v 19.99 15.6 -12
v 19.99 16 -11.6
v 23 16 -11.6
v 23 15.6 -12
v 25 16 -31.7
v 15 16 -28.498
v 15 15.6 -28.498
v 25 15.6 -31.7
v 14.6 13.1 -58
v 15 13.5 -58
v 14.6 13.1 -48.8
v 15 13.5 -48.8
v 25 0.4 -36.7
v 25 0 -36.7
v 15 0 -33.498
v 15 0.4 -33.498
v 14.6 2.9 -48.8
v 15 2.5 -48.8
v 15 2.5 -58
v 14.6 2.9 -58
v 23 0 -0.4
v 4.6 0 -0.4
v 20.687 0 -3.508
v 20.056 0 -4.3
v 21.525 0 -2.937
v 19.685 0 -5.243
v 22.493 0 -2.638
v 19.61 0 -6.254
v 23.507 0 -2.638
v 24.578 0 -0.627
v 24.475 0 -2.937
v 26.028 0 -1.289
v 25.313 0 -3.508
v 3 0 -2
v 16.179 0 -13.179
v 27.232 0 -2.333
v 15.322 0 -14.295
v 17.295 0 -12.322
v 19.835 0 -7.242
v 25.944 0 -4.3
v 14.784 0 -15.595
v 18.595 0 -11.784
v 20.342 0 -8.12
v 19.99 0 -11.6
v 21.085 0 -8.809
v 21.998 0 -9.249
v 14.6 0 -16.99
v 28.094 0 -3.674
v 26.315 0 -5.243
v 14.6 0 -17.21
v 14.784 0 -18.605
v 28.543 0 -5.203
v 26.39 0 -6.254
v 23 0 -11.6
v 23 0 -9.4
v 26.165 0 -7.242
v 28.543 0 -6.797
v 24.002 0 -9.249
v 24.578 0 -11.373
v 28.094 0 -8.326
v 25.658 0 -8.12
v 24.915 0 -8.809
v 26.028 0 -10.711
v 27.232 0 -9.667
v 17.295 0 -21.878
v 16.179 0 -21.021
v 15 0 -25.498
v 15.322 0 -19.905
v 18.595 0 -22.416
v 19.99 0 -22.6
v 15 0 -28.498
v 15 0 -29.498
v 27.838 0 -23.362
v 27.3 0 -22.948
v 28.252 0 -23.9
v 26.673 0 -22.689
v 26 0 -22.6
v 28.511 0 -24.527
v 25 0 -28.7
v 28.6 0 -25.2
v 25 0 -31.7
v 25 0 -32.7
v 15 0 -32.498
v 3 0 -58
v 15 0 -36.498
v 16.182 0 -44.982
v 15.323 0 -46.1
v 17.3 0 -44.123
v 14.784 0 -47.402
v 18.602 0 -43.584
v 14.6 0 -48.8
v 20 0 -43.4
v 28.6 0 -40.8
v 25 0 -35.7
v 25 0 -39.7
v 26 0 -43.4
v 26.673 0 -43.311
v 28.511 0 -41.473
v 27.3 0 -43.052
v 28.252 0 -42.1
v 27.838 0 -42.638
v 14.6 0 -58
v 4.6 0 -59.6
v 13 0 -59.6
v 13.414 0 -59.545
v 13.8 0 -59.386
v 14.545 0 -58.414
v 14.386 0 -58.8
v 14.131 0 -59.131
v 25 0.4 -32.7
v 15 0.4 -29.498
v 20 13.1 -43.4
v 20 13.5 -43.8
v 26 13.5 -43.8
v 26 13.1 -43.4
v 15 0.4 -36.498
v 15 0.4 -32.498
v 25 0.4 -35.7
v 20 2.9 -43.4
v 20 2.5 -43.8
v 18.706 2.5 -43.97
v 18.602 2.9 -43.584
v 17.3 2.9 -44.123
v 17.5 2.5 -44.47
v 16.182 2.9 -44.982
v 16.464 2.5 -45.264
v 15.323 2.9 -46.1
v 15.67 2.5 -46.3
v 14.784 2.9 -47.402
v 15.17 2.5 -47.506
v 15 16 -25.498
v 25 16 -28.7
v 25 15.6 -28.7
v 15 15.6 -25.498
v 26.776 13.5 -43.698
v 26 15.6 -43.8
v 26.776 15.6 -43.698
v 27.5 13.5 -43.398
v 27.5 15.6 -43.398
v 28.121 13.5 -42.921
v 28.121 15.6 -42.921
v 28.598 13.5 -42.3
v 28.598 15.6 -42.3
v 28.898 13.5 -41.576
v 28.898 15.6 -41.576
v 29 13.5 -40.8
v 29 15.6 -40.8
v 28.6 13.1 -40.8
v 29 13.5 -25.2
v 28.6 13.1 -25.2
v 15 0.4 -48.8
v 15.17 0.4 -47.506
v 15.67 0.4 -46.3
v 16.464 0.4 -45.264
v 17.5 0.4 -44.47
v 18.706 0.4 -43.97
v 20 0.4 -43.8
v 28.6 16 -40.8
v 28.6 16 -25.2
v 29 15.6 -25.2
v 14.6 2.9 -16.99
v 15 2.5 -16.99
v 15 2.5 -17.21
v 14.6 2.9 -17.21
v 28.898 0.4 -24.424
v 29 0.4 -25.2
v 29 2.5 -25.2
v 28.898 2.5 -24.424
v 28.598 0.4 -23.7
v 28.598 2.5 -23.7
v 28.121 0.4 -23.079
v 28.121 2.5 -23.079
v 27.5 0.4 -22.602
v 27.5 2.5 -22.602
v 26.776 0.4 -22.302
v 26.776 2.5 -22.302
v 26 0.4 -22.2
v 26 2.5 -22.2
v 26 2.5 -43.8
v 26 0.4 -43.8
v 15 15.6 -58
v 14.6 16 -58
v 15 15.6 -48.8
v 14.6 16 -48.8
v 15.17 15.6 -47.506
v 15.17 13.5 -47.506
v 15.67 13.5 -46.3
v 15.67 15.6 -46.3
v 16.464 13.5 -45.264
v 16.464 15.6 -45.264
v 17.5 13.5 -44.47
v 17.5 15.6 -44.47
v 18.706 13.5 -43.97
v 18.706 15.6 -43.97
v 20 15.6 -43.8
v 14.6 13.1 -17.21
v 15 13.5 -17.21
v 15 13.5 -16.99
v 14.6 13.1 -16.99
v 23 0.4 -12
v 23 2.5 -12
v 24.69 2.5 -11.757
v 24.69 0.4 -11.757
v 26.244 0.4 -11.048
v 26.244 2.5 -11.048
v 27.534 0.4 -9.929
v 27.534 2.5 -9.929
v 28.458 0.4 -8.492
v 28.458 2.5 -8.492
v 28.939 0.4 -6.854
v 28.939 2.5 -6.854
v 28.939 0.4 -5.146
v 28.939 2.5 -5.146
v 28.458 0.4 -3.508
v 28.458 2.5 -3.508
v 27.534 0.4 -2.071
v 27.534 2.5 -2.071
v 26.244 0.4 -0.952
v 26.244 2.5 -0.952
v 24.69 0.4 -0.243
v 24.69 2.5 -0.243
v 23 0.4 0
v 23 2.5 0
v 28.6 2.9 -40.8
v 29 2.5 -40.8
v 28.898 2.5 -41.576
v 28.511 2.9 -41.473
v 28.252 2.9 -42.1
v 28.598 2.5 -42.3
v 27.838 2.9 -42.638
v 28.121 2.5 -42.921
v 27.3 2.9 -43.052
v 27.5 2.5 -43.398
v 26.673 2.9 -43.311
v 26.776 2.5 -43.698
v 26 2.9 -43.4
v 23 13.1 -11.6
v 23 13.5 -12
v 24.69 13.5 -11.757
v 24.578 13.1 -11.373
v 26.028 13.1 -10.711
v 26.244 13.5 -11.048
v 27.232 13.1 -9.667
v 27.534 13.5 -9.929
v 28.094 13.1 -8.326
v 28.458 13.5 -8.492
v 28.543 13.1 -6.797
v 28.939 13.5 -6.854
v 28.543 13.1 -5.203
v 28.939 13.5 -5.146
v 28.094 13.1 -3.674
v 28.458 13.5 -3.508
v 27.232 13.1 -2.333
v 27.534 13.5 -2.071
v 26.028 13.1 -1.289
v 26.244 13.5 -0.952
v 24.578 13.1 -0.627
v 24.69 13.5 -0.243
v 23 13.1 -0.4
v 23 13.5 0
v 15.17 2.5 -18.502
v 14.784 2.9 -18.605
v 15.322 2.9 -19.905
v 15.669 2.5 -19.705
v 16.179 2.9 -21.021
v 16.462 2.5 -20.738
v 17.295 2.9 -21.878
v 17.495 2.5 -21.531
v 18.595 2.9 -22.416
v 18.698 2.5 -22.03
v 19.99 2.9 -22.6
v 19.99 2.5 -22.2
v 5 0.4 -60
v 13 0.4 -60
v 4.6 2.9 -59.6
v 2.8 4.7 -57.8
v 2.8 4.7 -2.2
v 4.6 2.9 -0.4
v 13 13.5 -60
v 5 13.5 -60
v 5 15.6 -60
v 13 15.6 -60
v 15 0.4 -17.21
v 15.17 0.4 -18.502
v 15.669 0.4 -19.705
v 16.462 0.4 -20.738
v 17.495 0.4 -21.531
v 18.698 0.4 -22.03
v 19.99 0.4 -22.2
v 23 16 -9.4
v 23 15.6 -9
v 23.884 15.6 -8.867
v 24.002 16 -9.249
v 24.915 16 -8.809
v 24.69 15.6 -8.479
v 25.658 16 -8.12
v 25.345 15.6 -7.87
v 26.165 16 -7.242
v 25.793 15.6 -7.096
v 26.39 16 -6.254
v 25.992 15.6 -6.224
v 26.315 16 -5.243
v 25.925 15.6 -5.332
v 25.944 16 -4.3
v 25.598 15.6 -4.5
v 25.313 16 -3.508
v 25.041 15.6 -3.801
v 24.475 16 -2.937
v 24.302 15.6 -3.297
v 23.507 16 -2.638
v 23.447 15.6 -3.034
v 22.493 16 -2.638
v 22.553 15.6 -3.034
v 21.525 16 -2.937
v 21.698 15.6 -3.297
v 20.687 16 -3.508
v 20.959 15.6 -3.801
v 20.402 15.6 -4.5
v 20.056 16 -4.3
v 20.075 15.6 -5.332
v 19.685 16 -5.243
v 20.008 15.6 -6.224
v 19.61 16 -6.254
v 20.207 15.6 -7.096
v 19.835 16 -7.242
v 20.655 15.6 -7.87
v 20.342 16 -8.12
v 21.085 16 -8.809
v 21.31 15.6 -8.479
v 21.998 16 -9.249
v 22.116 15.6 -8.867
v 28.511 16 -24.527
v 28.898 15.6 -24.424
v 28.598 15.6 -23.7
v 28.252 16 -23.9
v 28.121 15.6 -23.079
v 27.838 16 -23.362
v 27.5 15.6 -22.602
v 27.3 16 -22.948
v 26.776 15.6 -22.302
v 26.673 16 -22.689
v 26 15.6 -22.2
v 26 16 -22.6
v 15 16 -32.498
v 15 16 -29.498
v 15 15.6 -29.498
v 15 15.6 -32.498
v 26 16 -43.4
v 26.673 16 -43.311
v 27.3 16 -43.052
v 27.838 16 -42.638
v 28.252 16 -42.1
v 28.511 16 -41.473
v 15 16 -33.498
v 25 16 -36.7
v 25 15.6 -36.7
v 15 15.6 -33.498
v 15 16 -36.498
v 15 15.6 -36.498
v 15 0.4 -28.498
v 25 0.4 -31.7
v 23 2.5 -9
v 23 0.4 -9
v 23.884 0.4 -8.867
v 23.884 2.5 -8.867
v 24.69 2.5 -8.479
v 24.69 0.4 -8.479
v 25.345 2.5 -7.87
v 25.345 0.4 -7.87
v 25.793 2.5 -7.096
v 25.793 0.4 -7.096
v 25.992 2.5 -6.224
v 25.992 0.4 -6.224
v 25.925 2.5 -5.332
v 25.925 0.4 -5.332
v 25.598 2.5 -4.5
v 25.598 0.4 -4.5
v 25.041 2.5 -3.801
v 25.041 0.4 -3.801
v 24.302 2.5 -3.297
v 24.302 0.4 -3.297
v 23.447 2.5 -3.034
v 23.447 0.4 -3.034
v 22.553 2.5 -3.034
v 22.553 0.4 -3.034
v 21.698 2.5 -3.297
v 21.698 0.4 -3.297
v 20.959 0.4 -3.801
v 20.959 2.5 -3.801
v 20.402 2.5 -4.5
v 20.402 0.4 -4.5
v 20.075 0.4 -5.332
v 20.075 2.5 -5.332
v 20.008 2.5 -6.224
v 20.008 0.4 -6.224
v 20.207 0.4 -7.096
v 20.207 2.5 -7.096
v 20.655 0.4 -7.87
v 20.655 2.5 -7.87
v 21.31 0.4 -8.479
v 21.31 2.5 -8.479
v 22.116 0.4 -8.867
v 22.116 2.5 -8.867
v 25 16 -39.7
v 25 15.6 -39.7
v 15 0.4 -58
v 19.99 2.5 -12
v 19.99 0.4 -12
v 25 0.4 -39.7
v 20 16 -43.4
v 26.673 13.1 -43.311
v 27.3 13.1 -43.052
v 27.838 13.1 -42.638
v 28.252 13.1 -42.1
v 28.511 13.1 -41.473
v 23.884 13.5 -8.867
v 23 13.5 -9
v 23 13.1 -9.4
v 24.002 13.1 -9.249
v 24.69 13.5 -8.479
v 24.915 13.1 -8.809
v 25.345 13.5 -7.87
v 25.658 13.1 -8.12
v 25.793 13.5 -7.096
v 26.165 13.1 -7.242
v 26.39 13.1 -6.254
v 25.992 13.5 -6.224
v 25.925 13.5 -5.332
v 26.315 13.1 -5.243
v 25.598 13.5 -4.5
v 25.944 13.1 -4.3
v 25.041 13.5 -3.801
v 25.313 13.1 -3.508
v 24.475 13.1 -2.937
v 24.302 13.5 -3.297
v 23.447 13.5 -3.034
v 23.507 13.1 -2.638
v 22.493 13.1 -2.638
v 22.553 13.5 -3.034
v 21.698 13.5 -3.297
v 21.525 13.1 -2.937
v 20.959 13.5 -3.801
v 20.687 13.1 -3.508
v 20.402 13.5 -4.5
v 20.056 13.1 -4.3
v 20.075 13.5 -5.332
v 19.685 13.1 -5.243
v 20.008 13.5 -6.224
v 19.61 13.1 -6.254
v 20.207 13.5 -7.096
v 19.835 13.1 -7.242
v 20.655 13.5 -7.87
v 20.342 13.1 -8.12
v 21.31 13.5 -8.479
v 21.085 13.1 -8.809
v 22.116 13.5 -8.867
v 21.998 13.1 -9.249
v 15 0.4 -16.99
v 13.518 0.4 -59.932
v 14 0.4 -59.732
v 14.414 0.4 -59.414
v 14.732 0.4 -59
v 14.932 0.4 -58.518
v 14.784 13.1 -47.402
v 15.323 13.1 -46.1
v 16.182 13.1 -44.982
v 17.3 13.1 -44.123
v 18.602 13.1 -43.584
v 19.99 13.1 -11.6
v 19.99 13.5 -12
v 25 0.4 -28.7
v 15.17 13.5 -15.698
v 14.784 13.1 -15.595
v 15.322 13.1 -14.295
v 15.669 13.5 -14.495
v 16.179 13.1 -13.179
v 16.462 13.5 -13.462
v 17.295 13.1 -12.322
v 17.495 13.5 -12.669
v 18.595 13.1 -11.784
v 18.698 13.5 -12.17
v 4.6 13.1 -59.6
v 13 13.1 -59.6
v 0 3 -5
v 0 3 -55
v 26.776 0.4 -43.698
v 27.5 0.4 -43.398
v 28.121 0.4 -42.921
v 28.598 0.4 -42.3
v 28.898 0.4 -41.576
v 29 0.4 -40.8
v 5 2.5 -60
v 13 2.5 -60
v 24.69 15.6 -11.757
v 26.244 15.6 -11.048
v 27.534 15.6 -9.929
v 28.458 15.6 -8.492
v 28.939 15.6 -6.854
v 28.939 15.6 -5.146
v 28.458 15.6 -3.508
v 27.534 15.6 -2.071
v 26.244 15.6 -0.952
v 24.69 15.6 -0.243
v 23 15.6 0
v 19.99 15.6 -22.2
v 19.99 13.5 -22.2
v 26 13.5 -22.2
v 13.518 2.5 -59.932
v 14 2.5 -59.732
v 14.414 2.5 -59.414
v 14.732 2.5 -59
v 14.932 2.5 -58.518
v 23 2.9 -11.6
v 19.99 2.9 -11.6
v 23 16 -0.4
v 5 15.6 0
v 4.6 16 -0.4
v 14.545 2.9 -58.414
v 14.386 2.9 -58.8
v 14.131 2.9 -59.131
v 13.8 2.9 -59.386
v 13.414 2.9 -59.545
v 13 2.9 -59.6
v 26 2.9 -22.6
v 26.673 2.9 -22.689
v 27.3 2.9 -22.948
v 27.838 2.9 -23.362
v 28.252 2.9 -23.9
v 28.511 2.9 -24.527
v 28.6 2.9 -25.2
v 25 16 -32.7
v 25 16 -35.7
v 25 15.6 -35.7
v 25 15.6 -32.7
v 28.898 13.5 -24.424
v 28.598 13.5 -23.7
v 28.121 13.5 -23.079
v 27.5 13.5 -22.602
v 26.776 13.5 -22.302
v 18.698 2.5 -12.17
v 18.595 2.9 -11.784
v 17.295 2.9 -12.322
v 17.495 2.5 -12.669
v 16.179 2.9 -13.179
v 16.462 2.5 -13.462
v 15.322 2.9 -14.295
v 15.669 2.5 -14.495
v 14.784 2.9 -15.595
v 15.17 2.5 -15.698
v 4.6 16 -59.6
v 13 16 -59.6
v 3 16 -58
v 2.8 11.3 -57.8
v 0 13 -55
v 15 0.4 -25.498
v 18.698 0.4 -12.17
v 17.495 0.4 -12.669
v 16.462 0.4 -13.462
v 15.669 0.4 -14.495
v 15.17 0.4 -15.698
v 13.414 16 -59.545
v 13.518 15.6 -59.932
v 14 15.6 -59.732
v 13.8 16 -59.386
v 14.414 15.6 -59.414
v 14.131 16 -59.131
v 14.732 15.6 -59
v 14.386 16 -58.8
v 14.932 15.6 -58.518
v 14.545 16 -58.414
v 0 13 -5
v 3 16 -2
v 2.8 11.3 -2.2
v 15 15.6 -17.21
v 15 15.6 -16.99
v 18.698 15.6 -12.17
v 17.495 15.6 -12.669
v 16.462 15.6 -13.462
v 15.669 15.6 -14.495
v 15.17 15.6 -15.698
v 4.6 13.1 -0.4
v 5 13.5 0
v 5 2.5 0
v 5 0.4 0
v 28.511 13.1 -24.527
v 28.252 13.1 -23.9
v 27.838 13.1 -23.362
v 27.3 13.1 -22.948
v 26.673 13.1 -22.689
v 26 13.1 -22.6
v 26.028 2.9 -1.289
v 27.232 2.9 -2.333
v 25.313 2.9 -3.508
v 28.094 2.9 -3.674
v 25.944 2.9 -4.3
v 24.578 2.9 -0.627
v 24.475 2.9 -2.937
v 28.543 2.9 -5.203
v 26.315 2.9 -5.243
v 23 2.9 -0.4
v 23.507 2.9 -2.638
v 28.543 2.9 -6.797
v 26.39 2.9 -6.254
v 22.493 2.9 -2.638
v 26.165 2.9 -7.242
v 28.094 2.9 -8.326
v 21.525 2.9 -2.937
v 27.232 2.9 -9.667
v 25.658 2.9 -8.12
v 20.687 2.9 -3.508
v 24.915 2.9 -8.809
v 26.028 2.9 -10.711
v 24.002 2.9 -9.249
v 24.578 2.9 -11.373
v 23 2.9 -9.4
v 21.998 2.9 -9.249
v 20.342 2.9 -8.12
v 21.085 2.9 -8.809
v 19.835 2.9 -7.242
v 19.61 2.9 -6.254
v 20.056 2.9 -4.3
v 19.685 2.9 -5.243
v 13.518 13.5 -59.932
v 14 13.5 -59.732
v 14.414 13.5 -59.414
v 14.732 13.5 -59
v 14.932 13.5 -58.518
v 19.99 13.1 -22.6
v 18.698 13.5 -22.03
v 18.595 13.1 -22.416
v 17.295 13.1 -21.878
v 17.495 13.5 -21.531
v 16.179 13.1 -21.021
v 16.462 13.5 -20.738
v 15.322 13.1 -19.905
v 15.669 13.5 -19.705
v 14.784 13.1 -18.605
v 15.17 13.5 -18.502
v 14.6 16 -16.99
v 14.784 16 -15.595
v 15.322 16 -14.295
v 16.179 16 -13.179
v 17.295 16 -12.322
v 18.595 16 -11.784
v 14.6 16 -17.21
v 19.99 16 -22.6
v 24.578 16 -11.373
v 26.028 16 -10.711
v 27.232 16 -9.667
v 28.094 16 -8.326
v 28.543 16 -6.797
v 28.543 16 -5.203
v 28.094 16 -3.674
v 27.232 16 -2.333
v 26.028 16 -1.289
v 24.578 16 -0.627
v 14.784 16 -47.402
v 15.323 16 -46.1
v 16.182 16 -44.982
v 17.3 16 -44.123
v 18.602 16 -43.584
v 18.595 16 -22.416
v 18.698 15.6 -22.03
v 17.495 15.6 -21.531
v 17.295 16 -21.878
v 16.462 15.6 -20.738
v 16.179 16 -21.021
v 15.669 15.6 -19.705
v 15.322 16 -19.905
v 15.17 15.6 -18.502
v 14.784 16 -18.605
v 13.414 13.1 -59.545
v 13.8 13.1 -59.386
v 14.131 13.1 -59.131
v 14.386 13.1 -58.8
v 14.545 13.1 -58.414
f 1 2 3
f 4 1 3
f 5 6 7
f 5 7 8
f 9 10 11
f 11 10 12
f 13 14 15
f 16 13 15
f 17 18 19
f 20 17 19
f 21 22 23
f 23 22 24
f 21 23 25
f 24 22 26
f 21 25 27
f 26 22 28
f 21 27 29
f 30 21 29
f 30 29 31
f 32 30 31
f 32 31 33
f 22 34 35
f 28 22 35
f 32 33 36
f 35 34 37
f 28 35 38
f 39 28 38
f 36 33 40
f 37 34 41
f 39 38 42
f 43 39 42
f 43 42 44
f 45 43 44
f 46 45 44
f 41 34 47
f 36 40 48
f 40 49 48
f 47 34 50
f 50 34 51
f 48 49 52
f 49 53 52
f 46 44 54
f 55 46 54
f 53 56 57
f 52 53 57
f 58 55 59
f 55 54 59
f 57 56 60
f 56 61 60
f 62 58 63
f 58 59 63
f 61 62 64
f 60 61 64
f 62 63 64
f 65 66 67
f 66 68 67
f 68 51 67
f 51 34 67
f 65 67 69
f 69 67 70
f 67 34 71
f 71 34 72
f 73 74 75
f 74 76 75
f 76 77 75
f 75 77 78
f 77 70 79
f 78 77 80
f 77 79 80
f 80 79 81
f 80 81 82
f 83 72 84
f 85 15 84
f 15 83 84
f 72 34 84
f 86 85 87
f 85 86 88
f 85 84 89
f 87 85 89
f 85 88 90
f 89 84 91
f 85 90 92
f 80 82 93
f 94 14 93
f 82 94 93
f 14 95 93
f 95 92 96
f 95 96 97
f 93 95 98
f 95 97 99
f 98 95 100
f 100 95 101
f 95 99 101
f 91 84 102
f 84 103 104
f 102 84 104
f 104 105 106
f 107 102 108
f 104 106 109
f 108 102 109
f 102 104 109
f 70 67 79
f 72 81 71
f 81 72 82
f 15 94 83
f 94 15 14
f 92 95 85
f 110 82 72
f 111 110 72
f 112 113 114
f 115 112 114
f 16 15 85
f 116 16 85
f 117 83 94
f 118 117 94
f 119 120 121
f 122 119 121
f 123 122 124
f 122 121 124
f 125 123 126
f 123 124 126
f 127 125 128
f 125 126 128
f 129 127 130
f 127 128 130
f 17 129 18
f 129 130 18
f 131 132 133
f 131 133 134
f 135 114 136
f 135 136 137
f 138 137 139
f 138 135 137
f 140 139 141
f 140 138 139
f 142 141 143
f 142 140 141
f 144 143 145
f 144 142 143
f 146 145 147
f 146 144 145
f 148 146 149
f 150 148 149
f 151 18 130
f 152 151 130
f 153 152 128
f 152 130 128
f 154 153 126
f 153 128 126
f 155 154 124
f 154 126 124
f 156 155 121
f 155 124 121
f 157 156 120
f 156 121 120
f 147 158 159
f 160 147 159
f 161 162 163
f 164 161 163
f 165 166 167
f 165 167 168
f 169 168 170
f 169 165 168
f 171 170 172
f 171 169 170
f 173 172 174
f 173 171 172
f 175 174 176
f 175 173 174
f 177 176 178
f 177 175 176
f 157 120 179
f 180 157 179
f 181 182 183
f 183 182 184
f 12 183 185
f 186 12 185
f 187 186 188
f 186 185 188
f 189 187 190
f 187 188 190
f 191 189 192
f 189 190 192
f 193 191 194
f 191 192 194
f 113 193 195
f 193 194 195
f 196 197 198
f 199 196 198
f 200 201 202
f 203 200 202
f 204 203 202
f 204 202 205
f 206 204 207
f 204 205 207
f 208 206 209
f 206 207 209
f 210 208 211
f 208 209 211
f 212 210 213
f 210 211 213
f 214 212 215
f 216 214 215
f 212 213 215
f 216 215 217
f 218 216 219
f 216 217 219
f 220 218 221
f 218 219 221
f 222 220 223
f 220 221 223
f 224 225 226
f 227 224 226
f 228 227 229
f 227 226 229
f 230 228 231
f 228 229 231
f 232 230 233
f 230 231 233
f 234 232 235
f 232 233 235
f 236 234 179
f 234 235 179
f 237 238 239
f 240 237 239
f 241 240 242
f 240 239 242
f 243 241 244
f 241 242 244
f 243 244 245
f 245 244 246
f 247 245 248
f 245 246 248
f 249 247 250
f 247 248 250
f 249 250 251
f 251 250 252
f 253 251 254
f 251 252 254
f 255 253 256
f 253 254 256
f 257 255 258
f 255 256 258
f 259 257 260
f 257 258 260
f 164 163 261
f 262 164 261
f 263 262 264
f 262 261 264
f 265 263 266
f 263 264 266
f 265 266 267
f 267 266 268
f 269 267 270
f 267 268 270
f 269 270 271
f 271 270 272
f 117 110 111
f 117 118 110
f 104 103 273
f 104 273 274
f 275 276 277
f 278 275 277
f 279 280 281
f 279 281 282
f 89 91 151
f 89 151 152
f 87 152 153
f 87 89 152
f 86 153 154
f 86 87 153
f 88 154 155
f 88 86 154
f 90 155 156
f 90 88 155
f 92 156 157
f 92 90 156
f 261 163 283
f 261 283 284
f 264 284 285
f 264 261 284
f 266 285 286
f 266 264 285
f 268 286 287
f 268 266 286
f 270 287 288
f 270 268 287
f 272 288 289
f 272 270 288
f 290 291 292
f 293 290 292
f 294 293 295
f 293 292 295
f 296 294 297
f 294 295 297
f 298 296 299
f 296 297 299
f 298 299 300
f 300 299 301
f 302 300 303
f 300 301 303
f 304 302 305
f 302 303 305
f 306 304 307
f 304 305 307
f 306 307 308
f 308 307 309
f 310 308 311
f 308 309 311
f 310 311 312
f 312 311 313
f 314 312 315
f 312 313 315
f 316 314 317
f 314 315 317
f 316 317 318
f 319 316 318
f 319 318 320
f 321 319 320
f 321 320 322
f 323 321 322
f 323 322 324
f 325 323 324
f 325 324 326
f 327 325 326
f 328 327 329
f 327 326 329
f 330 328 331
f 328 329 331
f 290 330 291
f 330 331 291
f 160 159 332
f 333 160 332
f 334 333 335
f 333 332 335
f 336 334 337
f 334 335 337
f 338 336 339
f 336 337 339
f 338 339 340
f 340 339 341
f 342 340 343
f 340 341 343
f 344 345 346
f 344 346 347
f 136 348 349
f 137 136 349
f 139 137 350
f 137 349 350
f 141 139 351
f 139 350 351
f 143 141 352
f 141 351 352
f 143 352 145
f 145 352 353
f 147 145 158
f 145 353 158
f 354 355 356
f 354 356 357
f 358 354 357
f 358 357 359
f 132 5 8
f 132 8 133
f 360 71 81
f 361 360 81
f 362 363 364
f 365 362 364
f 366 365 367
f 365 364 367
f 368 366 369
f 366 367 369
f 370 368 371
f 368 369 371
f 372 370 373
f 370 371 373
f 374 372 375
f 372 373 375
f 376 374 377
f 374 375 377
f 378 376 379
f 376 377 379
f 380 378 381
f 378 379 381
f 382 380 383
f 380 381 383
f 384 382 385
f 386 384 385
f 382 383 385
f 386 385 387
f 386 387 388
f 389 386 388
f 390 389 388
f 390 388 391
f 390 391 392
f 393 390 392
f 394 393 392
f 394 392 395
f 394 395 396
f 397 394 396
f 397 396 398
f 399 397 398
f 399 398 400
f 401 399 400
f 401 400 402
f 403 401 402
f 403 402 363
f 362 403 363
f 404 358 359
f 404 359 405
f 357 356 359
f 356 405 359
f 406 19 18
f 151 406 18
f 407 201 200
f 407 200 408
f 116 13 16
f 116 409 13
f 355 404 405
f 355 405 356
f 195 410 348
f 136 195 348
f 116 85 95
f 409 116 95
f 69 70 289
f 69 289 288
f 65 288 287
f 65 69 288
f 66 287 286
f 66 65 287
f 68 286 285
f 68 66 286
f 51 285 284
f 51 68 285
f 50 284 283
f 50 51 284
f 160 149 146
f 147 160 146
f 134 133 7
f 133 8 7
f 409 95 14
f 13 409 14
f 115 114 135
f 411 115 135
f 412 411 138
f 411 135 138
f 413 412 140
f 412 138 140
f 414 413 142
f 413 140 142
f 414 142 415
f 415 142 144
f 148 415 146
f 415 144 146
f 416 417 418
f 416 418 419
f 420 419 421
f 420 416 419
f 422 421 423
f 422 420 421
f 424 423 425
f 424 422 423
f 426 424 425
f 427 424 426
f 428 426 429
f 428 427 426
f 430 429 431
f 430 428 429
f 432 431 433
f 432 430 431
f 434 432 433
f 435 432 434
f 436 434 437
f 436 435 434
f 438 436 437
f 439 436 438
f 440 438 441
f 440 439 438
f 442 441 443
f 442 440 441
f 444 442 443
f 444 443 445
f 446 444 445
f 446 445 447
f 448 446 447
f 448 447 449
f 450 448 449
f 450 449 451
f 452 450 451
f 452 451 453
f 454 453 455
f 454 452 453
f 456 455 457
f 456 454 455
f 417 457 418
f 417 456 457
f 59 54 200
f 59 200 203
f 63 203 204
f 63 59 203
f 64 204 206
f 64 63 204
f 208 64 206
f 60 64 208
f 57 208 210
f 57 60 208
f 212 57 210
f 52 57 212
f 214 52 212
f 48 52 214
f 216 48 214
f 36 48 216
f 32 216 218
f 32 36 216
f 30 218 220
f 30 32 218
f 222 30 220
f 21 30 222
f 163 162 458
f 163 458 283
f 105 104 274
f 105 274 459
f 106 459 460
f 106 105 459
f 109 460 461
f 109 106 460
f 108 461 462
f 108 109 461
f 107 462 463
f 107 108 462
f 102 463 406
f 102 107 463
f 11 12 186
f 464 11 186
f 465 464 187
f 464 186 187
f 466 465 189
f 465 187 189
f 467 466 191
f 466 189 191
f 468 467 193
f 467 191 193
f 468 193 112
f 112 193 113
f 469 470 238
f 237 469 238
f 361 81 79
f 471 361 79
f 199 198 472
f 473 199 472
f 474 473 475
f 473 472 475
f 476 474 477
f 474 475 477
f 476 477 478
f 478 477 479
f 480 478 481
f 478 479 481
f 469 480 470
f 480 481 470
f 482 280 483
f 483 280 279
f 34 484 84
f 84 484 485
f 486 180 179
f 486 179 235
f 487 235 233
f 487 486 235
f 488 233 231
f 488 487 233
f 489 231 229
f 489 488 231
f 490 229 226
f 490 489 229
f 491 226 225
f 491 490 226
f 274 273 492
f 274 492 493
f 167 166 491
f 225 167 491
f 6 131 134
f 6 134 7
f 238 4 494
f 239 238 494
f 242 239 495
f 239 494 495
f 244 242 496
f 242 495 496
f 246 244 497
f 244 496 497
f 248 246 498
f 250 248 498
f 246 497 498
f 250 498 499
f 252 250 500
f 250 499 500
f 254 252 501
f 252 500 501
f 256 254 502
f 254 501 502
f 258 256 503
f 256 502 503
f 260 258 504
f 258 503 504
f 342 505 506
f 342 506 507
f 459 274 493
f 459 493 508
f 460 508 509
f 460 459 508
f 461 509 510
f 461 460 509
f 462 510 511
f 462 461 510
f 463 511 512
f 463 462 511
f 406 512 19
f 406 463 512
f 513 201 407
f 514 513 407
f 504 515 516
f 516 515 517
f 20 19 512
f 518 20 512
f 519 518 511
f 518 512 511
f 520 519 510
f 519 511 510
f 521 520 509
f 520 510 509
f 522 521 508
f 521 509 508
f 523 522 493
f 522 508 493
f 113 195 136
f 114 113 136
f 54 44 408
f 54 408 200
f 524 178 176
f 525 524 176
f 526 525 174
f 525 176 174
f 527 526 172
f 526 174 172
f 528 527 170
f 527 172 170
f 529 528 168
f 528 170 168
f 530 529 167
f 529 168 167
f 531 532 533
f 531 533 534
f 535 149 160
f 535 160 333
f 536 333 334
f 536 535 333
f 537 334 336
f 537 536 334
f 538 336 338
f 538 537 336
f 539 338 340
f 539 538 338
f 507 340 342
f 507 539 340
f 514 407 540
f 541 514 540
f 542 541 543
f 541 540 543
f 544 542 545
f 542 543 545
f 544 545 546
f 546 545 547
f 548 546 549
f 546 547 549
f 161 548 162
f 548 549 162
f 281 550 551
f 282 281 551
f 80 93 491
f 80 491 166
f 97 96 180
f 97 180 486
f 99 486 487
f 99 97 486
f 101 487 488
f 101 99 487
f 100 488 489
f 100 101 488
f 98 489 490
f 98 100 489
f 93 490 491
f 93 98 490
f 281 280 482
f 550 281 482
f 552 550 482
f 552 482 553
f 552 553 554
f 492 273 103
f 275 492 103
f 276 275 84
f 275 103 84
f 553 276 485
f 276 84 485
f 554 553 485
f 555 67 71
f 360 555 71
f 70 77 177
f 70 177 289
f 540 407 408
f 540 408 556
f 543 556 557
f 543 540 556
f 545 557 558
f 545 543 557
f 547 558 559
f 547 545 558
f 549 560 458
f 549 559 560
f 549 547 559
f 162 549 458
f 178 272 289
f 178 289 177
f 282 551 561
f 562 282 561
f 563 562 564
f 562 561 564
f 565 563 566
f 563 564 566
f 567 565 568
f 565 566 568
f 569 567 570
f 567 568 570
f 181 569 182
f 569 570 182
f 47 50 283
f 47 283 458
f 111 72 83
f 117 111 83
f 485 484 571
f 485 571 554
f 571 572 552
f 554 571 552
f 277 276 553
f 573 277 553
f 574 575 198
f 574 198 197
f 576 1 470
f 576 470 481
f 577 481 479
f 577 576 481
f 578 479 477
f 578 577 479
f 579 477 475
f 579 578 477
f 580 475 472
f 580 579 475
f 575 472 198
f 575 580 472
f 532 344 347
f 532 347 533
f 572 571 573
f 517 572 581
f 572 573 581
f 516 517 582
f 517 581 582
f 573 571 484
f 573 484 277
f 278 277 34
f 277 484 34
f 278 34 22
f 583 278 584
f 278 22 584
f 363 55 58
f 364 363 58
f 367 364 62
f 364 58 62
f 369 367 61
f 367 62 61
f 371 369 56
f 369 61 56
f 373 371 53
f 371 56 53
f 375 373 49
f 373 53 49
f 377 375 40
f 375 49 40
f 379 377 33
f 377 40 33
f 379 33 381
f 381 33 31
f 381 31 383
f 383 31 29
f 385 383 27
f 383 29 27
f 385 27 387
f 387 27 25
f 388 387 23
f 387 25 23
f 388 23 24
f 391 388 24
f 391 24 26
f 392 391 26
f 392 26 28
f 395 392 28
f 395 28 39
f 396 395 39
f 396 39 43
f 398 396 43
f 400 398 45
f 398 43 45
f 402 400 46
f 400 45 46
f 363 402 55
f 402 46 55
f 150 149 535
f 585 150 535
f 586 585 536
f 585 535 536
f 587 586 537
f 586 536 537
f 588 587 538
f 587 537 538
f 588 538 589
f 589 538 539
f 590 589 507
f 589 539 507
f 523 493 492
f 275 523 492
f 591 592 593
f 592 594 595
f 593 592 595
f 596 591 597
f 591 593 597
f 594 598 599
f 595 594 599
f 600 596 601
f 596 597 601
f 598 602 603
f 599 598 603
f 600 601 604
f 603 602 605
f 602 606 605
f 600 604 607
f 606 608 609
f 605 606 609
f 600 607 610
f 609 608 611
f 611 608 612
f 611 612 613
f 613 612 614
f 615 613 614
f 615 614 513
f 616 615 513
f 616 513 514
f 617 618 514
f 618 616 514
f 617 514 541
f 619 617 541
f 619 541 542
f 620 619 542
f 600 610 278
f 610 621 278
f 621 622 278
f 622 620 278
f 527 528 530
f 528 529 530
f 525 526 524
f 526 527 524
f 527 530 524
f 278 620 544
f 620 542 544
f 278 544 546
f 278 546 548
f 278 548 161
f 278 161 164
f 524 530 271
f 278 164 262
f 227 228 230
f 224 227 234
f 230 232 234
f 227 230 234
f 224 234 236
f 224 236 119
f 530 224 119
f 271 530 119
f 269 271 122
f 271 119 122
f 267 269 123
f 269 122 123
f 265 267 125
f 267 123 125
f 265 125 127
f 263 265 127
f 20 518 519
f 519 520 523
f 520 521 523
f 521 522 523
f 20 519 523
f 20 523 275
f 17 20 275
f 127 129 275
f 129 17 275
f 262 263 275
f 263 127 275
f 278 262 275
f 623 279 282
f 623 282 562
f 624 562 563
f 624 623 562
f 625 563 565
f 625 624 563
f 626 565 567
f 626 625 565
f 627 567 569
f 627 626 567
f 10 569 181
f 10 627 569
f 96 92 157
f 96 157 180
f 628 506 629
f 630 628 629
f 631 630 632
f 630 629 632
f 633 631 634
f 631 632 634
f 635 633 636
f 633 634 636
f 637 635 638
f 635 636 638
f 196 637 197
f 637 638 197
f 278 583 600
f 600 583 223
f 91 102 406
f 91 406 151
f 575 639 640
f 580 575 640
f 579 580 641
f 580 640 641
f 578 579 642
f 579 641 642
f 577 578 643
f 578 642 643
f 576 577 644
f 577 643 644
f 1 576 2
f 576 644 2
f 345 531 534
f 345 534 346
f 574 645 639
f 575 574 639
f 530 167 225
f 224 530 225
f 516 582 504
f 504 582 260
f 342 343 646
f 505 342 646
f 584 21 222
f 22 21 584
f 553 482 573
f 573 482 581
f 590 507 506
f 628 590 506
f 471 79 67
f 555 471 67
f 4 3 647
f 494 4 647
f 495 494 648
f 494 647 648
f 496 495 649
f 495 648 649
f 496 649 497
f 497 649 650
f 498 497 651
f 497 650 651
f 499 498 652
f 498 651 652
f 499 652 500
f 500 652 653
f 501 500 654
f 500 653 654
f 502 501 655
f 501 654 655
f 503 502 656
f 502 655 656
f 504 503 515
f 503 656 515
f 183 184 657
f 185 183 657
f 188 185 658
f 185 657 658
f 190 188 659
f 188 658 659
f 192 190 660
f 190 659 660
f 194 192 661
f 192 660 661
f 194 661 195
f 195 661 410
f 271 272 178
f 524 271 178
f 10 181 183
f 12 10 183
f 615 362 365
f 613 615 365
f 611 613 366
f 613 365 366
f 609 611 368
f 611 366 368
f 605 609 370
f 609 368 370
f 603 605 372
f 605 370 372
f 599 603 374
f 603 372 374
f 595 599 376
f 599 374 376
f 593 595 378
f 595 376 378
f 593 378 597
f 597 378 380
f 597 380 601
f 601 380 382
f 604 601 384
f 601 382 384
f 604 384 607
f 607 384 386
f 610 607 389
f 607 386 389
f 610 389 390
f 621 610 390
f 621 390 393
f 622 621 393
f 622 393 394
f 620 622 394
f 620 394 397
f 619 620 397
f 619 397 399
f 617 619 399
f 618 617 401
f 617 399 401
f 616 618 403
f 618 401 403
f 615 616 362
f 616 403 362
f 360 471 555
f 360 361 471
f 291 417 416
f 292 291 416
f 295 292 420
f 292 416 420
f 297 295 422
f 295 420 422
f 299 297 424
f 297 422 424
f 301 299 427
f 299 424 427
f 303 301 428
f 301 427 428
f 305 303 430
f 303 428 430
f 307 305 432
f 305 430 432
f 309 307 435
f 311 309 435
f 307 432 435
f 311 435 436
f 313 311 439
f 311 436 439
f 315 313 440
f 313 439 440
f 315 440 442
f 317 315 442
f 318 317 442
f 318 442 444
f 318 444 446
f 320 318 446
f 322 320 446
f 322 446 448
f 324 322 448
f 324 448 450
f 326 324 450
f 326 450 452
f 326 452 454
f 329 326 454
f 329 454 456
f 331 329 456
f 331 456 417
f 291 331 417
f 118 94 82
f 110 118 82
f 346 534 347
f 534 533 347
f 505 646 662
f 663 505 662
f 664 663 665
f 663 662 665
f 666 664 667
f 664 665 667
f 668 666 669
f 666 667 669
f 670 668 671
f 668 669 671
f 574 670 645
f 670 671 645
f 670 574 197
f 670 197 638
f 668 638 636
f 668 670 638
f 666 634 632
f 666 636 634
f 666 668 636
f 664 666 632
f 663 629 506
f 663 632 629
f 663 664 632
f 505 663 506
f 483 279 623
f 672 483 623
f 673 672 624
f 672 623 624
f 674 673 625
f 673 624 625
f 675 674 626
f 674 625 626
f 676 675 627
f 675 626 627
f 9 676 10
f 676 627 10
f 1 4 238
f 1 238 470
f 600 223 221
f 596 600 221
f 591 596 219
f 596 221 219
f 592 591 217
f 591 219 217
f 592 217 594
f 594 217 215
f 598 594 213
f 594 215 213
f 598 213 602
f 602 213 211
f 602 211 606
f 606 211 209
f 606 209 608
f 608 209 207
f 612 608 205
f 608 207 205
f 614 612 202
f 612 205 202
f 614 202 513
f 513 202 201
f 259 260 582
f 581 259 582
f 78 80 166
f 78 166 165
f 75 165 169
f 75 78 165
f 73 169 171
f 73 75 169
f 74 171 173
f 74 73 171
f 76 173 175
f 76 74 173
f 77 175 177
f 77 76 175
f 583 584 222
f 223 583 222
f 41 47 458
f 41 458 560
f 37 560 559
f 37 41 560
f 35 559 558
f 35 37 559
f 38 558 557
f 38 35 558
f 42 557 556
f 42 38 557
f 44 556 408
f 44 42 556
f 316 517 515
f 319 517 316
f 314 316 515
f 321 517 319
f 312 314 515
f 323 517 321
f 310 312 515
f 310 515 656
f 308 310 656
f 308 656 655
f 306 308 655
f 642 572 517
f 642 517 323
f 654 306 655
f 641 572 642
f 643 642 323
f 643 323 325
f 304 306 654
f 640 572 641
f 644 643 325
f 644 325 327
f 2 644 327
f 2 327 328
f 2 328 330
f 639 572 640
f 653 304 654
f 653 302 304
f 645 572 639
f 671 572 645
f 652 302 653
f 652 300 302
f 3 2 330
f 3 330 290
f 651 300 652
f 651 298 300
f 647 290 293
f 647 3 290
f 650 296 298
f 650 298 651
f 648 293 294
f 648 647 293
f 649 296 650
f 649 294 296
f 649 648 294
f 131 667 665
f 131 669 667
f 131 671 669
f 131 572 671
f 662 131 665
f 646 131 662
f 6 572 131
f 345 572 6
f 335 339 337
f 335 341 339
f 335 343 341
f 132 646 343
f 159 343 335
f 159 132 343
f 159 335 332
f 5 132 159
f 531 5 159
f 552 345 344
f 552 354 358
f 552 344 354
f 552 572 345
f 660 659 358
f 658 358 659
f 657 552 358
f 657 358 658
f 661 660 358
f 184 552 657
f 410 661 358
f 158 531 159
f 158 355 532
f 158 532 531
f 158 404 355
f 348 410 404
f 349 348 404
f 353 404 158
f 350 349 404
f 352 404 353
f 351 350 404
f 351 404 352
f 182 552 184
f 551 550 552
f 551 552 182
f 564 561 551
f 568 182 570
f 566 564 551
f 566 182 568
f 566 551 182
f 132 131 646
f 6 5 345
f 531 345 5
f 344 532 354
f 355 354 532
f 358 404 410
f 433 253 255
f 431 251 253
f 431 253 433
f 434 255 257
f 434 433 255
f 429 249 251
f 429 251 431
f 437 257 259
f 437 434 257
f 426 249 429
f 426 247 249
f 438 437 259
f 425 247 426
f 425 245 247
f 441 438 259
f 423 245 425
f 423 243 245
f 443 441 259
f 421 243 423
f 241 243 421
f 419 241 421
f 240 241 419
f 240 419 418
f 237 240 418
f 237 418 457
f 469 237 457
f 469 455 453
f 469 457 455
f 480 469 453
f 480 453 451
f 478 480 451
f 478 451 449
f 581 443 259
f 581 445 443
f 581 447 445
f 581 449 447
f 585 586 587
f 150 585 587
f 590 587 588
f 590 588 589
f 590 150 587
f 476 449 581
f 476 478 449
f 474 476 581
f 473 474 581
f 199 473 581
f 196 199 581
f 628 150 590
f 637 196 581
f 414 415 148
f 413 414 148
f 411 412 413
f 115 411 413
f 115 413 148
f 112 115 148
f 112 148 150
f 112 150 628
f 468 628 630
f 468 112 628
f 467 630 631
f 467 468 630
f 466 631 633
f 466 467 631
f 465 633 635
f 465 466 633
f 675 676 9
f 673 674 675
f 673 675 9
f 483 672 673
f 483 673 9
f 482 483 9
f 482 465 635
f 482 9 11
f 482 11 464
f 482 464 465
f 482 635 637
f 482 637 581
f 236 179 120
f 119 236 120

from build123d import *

# Parameters (mm, degrees)
SKETCH_1_W          = 29
SKETCH_1_H          = 60
EXTRUDE_1_DEPTH     = 16
SKETCH_2_W          = 26.2
SKETCH_2_H          = 10.2
CUT_EXTRUDE_1_DEPTH = 69.534662763
SKETCH_3_R          = 3
CUT_EXTRUDE_2_DEPTH = 69.534662763
CUT_EXTRUDE_3_DEPTH = 69.534662763
CUT_EXTRUDE_4_DEPTH = 69.534662763
CUT_EXTRUDE_5_DEPTH = 69.534662763
FILLET_1_R          = 3
CHAMFER_1_SIZE      = 5
CHAMFER_3_SIZE      = 3
CHAMFER_4_SIZE      = 1.8
FILLET_2_R          = 2
CHAMFER_2_SIZE      = 0.4
CUT_EXTRUDE_6_DEPTH = 0.4


with BuildPart() as part:
    # 草图1 → 凸台-拉伸1 (new body)
    with BuildSketch(Plane(origin=(0, 0, 0), x_dir=(1, 0, 0), z_dir=(0, 1, 0))):
        with Locations((14.5, 30)):
            Rectangle(SKETCH_1_W, SKETCH_1_H)
    extrude(amount=EXTRUDE_1_DEPTH)

    # 草图2 → 切除-拉伸1 (cut, through all)
    with BuildSketch(Plane(origin=(0, 0, -60), x_dir=(-1, 0, 0), z_dir=(0, 0, -1))):
        with Locations((-15.9, 8)):
            Rectangle(SKETCH_2_W, SKETCH_2_H)
    extrude(amount=-CUT_EXTRUDE_1_DEPTH, mode=Mode.SUBTRACT)

    # 草图3 → 切除-拉伸2 (cut, through all)
    with BuildSketch(Plane(origin=(0, 0, 0), x_dir=(-1, 0, 0), z_dir=(0, -1, 0))):
        with Locations(Location((-23, 6, 0), (0, 0, 90))):
            Circle(SKETCH_3_R)
    extrude(amount=-CUT_EXTRUDE_2_DEPTH, mode=Mode.SUBTRACT)

    # 草图4 → 切除-拉伸3 (cut, through all)
    with BuildSketch(Plane(origin=(0, 16, 0), x_dir=(1, 0, 0), z_dir=(0, 1, 0))):
        with BuildLine():
            Line((23, 0), (24.972936344, -1.282691022))
            Line((24.972936344, -1.282691022), (32.744307438, -1.586182692))
            Line((32.744307438, -1.586182692), (32.104431406, 9.686424342))
            Line((32.104431406, 9.686424342), (29.958145659, 12))
            Line((29.958145659, 12), (23, 12))
            ThreePointArc((23, 12), (29, 6), (23, 0))
        make_face()
    extrude(amount=-CUT_EXTRUDE_3_DEPTH, mode=Mode.SUBTRACT)

    # 草图5 → 切除-拉伸4 (cut, through all)
    with BuildSketch(Plane(origin=(0, 16, 0), x_dir=(1, 0, 0), z_dir=(0, 1, 0))):
        with BuildLine():
            Line((29, 12), (19.99, 12))
            ThreePointArc((19.99, 12), (16.461537162, 13.461537162), (15, 16.99))
            Line((15, 16.99), (15, 17.21))
            ThreePointArc((15, 17.21), (16.461537162, 20.738462838), (19.99, 22.2))
            Line((19.99, 22.2), (29, 22.2))
            Line((29, 22.2), (29, 12))
        make_face()
    extrude(amount=-CUT_EXTRUDE_4_DEPTH, mode=Mode.SUBTRACT)

    # 草图6 → 切除-拉伸5 (cut, through all)
    with BuildSketch(Plane(origin=(0, 16, 0), x_dir=(1, 0, 0), z_dir=(0, 1, 0))):
        with BuildLine():
            Line((29, 60), (15, 60))
            Line((15, 60), (15, 48.8))
            ThreePointArc((15, 48.8), (16.464466094, 45.264466094), (20, 43.8))
            Line((20, 43.8), (29, 43.8))
            Line((29, 43.8), (29, 60))
        make_face()
    extrude(amount=-CUT_EXTRUDE_5_DEPTH, mode=Mode.SUBTRACT)

    # 圆角1
    fillet_1_edges = [part.edges().sort_by_distance(p)[0] for p in [
        (29, 14.55, -43.8),
        (29, 1.45, -43.8),
        (29, 14.55, -22.2),
        (29, 1.45, -22.2),
    ]]
    fillet(fillet_1_edges, radius=FILLET_1_R)

    # 倒角1
    # the kernel refuses this chamfer: 5 mm, written as the material it takes off along each edge
    with BuildSketch(Plane(origin=(0, -12.85841494, -60), x_dir=(0.9996219169112968, 0, -0.027495876610586317), z_dir=(0, 1, 0)), Plane(origin=(0, -12.85841494, 0), x_dir=(-0.027495876610586372, 0, -0.9996219169112968), z_dir=(0, 1, 0))) as chamfer_1_piece_1:
        Polygon((CHAMFER_1_SIZE * 0.999621916911, -CHAMFER_1_SIZE * 0.0274958766106), (-CHAMFER_1_SIZE * 0.0274958766106, -CHAMFER_1_SIZE * 0.999621916911), (0, 0), align=None)
    extrude(amount=41.71682988, mode=Mode.SUBTRACT)

    # 倒角3
    chamfer_3_edges = [part.edges().sort_by_distance(p)[0] for p in [
        (0, 0, -30),
        (0, 16, -30),
    ]]
    chamfer(chamfer_3_edges, length=CHAMFER_3_SIZE)

    # 倒角4
    chamfer_4_edges = [part.edges().sort_by_distance(p)[0] for p in [
        (2.8, 13.1, -30),
        (2.8, 2.9, -30),
    ]]
    chamfer(chamfer_4_edges, length=CHAMFER_4_SIZE)

    # 圆角2
    fillet_2_edges = [part.edges().sort_by_distance(p)[0] for p in [
        (15, 14.55, -60),
        (15, 1.45, -60),
    ]]
    fillet(fillet_2_edges, radius=FILLET_2_R)

    # 倒角2
    chamfer_2_edges = [part.edges().sort_by_distance(p)[0] for p in [
        (23, 0, -3),
        (29, 0, -6),
        (21.495, 0, -12),
        (16.461537162, 0, -13.461537162),
        (15, 0, -17.1),
        (16.461537162, 0, -20.738462838),
        (22.995, 0, -22.2),
        (28.121320344, 0, -23.078679656),
        (29, 0, -33),
        (28.121320344, 0, -42.921320344),
        (23, 0, -43.8),
        (16.464466094, 0, -45.264466094),
        (15, 0, -53.4),
        (9, 0, -60),
        (14, 0, 0),
        (29, 13.1, -6),
        (21.495, 13.1, -12),
        (16.461537162, 13.1, -13.461537162),
        (15, 13.1, -17.1),
        (16.461537162, 13.1, -20.738462838),
        (22.995, 13.1, -22.2),
        (28.121320344, 13.1, -23.078679656),
        (29, 13.1, -33),
        (28.121320344, 13.1, -42.921320344),
        (23, 13.1, -43.8),
        (16.464466094, 13.1, -45.264466094),
        (15, 13.1, -53.4),
        (9, 13.1, -60),
        (14, 13.1, 0),
        (23, 13.1, -3),
        (9, 2.9, -60),
        (15, 2.9, -53.4),
        (16.464466094, 2.9, -45.264466094),
        (23, 2.9, -43.8),
        (28.121320344, 2.9, -42.921320344),
        (29, 2.9, -33),
        (28.121320344, 2.9, -23.078679656),
        (22.995, 2.9, -22.2),
        (16.461537162, 2.9, -20.738462838),
        (15, 2.9, -17.1),
        (16.461537162, 2.9, -13.461537162),
        (21.495, 2.9, -12),
        (29, 2.9, -6),
        (14, 2.9, 0),
        (23, 2.9, -3),
        (9, 16, -60),
        (15, 16, -53.4),
        (16.464466094, 16, -45.264466094),
        (23, 16, -43.8),
        (28.121320344, 16, -42.921320344),
        (29, 16, -33),
        (28.121320344, 16, -23.078679656),
        (22.995, 16, -22.2),
        (16.461537162, 16, -20.738462838),
        (15, 16, -17.1),
        (16.461537162, 16, -13.461537162),
        (21.495, 16, -12),
        (29, 16, -6),
        (14, 16, 0),
        (23, 16, -3),
        (14.414213562, 0, -59.414213562),
        (14.414213562, 13.1, -59.414213562),
        (14.414213562, 2.9, -59.414213562),
        (14.414213562, 16, -59.414213562),
    ]]
    chamfer(chamfer_2_edges, length=CHAMFER_2_SIZE)

    # 草图7 → 切除-拉伸6 (cut)
    with BuildSketch(Plane(origin=(0, 16, 0), x_dir=(1, 0, 0), z_dir=(0, 1, 0))):
        Polygon((25, 28.7), (15, 25.498437881), (15, 28.498437881), (25, 31.7), align=None)
        Polygon((25, 32.7), (15, 29.498437881), (15, 32.498437881), (25, 35.7), align=None)
        Polygon((25, 36.7), (15, 33.498437881), (15, 36.498437881), (25, 39.7), align=None)
    cut_extrude_6 = extrude(amount=-CUT_EXTRUDE_6_DEPTH, mode=Mode.SUBTRACT)

    # 镜向1: 切除-拉伸6 across plane
    add(cut_extrude_6.mirror(Plane.ZX.offset(8)), mode=Mode.SUBTRACT)


solid = part.part
